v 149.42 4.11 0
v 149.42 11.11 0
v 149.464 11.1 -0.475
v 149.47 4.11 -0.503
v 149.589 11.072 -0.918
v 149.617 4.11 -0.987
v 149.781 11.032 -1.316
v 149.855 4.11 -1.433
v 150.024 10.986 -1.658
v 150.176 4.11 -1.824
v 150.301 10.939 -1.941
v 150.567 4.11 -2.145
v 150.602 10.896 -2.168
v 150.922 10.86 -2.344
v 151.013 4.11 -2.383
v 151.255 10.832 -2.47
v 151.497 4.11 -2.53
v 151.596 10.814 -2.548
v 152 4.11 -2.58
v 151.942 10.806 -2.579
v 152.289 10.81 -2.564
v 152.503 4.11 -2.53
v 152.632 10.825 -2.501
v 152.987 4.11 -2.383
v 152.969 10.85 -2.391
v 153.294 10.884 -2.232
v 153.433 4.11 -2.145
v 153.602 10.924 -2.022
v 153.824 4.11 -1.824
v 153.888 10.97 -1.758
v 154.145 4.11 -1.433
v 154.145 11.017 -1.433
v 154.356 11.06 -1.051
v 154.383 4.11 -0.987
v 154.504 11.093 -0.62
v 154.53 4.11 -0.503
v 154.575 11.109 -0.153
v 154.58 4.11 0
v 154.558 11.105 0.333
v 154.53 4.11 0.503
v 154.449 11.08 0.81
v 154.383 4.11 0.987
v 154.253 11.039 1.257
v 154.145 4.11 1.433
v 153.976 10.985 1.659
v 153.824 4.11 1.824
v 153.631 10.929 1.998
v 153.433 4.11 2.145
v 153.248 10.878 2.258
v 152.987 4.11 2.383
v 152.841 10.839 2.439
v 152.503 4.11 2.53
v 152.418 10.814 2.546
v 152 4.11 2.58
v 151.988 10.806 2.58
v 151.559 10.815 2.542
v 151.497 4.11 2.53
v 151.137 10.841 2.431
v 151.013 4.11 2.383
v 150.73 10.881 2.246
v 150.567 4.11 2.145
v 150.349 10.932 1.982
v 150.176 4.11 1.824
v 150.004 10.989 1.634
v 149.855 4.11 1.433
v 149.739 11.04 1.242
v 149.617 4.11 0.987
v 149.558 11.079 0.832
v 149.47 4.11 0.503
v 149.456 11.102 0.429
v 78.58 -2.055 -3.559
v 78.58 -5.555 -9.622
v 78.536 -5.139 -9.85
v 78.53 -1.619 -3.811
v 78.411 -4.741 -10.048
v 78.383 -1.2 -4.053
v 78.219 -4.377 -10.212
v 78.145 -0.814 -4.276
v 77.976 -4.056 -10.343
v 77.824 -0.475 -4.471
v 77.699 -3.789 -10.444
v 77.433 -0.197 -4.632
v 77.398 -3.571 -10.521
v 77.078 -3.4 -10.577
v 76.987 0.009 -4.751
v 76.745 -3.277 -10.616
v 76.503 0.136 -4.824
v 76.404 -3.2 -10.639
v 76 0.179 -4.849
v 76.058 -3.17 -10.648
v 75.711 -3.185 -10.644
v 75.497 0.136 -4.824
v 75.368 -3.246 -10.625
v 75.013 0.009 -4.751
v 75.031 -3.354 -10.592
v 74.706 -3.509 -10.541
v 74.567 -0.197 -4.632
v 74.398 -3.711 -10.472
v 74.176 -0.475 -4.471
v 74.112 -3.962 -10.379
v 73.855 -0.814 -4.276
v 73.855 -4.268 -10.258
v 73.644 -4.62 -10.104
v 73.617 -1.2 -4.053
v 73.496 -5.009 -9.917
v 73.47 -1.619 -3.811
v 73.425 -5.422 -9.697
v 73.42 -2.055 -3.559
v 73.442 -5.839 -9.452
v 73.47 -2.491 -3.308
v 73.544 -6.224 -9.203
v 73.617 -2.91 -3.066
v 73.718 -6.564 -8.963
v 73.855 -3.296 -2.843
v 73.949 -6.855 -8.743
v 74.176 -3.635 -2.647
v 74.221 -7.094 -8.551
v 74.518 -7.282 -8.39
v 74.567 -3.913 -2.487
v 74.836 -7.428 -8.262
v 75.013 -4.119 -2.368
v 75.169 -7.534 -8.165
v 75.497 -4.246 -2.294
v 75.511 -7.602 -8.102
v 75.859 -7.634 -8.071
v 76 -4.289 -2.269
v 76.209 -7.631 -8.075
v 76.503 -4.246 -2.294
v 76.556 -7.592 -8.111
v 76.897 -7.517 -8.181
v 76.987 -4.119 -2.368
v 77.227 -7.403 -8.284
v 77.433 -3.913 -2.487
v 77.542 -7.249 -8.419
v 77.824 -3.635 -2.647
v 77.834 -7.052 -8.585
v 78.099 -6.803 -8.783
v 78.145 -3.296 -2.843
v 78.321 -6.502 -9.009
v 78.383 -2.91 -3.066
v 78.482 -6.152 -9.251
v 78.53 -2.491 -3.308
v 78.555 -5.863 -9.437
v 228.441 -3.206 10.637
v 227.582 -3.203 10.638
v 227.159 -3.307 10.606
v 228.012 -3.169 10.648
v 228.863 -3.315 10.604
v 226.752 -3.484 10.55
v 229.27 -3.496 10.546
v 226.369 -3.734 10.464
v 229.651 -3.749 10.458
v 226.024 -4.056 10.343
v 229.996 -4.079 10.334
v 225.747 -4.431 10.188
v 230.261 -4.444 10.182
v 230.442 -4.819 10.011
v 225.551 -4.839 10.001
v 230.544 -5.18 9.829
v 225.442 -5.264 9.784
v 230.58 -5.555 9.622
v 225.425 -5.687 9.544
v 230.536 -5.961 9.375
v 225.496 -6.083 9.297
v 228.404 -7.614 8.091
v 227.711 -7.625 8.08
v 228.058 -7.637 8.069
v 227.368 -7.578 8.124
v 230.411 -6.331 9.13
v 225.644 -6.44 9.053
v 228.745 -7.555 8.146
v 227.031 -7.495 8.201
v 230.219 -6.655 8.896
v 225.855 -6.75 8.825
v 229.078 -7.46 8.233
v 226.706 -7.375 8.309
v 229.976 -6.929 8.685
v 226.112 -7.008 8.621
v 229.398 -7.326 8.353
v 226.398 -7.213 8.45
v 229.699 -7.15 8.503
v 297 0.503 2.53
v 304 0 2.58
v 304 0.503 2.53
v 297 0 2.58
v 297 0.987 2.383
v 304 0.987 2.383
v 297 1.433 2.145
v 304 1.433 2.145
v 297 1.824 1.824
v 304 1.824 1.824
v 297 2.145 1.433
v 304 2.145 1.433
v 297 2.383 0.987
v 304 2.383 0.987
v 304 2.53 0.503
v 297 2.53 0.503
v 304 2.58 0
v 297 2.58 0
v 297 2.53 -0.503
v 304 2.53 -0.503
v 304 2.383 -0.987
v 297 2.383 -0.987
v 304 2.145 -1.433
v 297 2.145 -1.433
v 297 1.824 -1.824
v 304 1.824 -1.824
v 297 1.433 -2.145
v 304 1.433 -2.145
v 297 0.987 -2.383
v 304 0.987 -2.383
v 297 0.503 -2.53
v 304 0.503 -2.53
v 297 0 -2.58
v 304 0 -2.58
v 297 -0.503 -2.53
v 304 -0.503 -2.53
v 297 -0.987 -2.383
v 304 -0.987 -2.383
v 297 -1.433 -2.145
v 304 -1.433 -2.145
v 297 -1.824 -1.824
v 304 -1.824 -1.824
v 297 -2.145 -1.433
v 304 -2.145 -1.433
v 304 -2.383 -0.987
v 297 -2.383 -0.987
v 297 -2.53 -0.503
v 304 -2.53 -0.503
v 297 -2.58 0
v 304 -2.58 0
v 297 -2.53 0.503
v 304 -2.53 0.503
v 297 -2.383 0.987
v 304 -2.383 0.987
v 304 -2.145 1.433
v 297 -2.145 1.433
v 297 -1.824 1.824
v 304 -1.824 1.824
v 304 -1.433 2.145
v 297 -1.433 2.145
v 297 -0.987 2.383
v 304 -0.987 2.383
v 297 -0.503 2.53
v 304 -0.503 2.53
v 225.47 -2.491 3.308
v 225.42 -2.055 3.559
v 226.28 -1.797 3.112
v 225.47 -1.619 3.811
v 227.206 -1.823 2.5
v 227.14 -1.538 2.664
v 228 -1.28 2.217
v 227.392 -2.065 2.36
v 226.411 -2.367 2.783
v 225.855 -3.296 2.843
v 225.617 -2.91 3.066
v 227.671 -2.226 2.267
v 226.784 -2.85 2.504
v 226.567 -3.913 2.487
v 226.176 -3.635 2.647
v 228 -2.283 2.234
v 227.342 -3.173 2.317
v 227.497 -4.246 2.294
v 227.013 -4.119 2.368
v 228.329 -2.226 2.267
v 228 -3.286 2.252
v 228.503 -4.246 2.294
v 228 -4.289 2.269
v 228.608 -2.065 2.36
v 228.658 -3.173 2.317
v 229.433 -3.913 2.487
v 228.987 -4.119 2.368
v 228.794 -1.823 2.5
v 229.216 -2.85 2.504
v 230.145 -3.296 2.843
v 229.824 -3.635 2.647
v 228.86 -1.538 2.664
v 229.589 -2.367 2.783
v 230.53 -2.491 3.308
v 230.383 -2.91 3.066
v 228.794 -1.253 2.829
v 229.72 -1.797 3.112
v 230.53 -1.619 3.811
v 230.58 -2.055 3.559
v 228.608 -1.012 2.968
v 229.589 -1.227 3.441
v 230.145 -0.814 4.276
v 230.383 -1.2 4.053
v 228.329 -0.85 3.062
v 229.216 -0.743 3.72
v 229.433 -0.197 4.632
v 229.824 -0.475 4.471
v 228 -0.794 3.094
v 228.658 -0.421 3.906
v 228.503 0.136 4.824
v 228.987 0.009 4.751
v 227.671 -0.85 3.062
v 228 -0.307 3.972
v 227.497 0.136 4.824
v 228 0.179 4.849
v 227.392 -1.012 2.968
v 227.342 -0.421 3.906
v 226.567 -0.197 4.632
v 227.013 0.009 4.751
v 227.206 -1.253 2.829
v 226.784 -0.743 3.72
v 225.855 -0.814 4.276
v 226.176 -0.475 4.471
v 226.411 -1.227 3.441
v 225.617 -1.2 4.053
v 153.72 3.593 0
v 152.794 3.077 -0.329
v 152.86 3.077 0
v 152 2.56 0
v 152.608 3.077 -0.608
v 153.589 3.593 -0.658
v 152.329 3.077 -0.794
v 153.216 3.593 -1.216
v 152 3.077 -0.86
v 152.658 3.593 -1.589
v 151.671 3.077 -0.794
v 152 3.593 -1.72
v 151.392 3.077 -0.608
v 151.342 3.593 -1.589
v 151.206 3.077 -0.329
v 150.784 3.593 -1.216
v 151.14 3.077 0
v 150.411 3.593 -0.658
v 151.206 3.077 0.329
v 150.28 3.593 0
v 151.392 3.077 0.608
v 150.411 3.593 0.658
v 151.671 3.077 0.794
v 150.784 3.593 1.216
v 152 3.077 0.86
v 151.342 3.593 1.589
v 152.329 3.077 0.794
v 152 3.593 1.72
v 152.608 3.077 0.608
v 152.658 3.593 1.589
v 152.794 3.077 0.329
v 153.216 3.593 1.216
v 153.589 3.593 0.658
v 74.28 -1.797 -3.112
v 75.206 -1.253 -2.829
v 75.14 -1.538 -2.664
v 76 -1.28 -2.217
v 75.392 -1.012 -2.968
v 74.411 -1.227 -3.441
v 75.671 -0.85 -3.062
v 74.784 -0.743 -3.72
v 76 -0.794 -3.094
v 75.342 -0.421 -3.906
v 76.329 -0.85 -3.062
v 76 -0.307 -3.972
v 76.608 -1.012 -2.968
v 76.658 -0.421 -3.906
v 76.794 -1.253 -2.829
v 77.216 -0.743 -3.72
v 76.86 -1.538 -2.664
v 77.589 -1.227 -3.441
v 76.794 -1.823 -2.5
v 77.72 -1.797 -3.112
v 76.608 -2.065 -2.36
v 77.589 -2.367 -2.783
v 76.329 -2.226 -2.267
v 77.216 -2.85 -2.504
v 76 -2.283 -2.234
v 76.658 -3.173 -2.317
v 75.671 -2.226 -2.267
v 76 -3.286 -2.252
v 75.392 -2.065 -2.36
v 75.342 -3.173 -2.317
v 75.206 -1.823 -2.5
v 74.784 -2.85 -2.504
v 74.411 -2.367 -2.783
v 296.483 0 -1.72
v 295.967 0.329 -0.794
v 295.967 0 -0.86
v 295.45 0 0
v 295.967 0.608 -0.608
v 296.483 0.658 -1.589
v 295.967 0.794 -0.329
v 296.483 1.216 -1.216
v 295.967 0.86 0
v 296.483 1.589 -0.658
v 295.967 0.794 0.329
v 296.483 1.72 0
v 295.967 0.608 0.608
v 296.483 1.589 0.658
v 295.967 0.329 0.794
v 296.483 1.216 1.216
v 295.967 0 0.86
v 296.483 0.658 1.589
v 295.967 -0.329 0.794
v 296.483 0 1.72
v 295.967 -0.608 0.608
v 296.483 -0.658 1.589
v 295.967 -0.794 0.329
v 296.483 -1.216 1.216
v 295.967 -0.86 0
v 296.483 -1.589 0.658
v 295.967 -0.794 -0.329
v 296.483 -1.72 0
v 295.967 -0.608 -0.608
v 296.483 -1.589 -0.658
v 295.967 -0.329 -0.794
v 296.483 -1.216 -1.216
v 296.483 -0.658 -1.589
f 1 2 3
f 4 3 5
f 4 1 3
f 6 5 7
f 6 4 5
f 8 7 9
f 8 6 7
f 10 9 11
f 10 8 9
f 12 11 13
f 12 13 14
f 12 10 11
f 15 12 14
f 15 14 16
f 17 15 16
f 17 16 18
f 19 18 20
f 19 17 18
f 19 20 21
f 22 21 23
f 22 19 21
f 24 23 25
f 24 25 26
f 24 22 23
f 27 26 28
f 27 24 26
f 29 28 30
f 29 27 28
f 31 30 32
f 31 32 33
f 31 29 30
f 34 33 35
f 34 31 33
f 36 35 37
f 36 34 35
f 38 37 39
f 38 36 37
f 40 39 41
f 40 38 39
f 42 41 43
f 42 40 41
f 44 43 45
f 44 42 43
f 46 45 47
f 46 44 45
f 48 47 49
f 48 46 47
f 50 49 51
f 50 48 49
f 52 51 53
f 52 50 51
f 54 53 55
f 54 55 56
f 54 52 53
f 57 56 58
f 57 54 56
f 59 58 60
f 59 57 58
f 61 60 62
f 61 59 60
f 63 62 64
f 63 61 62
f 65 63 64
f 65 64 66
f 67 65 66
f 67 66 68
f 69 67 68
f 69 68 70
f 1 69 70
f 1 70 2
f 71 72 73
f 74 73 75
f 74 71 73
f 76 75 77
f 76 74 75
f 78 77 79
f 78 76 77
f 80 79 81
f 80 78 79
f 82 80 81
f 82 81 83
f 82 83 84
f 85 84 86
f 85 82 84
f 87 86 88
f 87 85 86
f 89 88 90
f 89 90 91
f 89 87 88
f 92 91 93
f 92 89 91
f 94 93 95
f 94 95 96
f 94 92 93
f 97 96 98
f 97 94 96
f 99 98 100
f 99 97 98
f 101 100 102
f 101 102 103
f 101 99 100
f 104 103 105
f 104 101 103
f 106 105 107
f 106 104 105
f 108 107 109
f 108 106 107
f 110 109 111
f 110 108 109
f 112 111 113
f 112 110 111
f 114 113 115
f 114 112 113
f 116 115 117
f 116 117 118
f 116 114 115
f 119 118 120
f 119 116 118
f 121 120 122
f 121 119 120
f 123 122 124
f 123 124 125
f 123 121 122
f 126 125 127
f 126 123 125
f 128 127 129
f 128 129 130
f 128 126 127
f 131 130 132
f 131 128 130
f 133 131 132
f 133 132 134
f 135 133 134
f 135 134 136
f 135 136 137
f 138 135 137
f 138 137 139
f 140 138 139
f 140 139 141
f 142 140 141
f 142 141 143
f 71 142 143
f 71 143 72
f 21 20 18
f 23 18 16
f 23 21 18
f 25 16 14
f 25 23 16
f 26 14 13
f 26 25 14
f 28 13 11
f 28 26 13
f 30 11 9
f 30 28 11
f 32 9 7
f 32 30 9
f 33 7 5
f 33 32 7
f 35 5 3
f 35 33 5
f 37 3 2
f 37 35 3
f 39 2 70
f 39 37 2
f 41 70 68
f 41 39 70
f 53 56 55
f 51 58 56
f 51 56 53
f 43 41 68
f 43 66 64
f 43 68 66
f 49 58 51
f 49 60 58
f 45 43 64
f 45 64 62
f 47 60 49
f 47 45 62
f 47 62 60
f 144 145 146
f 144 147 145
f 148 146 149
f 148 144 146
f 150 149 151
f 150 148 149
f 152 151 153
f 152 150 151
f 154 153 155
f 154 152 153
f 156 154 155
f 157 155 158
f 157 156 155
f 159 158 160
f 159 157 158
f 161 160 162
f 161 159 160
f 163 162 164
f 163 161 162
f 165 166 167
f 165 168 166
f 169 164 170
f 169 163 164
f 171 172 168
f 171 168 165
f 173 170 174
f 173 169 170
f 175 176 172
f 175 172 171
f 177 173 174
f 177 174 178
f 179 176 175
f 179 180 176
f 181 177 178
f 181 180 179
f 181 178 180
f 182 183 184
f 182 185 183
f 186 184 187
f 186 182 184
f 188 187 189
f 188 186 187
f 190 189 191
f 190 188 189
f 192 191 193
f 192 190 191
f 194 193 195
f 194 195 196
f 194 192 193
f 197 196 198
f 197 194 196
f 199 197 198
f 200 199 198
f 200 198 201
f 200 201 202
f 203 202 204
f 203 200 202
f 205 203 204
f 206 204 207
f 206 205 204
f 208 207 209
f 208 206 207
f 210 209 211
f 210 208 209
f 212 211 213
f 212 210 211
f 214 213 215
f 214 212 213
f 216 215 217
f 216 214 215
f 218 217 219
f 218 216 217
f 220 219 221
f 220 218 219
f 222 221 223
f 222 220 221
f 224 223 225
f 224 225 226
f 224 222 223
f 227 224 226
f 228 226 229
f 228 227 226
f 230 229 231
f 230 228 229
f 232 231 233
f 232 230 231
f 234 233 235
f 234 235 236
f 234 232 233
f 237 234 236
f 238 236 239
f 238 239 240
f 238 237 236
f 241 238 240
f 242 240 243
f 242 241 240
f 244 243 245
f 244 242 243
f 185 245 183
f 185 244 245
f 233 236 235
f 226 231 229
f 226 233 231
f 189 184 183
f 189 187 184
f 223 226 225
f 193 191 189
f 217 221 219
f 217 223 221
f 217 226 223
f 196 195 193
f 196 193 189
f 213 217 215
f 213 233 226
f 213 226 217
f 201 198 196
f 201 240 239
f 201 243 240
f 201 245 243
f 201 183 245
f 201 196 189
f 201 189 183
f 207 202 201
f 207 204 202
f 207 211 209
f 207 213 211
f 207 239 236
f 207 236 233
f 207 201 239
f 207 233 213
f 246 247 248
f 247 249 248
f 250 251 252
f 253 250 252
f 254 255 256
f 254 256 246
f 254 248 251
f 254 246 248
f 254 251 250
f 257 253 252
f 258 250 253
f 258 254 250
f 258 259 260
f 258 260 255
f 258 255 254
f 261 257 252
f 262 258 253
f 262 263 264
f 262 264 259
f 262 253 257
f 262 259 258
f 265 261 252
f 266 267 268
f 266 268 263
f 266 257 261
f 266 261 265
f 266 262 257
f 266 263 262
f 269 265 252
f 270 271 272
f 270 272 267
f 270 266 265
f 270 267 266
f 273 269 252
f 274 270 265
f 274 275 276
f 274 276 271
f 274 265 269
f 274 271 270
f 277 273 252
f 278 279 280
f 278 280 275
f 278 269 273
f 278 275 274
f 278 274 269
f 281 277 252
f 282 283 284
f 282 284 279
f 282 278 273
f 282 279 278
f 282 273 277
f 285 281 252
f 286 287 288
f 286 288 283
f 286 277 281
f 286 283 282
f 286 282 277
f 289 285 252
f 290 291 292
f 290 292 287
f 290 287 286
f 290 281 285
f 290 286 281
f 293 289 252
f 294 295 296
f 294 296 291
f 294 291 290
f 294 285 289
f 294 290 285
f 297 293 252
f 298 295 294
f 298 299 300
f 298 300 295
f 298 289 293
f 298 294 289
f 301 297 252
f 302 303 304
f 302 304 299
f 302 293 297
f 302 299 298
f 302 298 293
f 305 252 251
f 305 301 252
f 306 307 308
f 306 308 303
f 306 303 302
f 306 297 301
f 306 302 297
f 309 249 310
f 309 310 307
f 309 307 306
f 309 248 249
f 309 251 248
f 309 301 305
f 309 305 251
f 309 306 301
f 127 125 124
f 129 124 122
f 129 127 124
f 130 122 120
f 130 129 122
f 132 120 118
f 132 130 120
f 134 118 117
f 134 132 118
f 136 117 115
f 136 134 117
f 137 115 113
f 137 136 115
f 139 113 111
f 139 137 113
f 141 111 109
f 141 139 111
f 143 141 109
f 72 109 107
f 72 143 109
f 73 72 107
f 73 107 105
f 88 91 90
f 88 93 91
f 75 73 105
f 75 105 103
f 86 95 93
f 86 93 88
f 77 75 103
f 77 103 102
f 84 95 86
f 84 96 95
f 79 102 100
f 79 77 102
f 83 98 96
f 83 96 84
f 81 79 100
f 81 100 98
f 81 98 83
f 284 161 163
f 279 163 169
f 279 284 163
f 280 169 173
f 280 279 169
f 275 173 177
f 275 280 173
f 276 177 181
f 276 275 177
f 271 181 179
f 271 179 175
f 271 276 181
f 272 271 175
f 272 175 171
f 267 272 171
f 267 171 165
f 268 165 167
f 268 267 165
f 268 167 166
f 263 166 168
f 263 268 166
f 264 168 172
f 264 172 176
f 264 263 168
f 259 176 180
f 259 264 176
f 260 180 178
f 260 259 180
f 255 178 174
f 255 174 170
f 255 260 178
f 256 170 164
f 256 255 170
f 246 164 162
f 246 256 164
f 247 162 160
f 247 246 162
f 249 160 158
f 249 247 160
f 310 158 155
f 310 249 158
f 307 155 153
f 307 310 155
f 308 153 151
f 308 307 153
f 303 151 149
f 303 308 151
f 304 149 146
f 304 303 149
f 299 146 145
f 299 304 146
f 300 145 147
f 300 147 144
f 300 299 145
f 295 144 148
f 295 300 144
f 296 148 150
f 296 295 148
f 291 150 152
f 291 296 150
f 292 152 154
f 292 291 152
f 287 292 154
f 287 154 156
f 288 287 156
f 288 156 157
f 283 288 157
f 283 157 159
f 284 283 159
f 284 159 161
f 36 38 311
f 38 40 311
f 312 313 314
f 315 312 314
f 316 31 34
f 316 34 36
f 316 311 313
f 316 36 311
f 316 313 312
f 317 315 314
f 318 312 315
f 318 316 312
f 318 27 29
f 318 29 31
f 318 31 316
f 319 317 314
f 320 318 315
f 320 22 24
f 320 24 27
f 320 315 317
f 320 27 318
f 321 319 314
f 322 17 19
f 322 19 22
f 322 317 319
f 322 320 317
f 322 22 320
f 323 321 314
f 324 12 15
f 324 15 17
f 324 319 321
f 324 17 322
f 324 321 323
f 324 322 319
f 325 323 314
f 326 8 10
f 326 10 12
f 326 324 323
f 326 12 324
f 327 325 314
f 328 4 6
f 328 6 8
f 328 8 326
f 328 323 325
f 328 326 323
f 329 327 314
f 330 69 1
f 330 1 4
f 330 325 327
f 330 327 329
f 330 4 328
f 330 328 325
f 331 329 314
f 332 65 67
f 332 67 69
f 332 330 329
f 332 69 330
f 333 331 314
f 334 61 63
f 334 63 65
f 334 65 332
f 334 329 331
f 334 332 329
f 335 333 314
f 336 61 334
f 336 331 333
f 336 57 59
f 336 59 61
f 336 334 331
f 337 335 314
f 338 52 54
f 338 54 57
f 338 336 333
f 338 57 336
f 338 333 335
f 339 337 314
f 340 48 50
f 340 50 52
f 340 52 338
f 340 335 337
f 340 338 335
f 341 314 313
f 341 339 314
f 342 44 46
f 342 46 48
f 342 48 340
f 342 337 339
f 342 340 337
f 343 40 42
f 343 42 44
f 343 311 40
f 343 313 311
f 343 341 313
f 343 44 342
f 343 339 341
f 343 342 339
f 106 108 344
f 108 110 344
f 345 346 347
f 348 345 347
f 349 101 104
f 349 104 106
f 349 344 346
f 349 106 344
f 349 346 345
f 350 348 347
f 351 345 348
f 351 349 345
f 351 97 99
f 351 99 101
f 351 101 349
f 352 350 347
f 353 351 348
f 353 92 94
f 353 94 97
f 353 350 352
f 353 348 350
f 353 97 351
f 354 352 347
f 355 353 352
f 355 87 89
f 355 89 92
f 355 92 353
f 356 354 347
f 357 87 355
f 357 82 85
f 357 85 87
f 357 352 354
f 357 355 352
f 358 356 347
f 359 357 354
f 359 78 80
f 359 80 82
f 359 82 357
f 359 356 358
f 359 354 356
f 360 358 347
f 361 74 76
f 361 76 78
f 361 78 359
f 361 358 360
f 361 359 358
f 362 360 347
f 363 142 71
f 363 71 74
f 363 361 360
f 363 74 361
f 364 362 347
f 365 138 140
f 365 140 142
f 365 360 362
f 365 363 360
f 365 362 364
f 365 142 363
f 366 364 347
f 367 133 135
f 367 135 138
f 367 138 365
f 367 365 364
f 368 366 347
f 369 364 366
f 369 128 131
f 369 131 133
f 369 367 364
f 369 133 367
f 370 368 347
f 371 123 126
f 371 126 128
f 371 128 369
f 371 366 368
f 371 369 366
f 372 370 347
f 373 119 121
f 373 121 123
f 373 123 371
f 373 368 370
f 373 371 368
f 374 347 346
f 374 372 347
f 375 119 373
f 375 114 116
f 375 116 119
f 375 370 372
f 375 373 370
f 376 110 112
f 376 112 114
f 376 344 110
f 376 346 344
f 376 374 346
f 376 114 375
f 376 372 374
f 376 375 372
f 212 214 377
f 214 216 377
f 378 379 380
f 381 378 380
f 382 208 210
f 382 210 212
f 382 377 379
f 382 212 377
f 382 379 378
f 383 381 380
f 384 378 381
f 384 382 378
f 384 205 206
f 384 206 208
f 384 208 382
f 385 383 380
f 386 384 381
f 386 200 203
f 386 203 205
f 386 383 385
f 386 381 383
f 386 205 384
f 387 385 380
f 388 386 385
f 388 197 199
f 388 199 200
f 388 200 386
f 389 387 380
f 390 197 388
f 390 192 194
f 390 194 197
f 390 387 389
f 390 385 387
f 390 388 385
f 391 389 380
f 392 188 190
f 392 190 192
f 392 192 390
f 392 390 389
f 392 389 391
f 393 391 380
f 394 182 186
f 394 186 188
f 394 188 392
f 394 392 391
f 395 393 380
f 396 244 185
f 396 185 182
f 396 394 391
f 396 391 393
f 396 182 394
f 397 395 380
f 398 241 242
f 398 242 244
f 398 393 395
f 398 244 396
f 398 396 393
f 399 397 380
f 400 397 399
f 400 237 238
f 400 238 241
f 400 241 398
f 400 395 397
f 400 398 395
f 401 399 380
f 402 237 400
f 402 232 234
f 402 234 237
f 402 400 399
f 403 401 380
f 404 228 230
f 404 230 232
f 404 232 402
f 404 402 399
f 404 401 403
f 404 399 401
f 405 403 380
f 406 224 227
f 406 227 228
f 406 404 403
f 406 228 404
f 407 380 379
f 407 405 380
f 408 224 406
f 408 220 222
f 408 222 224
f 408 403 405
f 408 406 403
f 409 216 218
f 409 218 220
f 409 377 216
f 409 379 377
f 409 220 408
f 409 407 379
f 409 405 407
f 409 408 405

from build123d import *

# Parameters (mm, degrees)
SKETCH1_R                            = 11.11
BOSS_EXTRUDE1_DEPTH                  = 304
F_3_0_3_DIAMETER_HOLE2_D             = 3
F_3_0_3_DIAMETER_HOLE2_DEPTH         = 11
F_3_0_3_DIAMETER_HOLE2_TIP           = 0.901290929
F_13_64_0_20313_DIAMETER_HOLE2_D     = 5.159502
F_13_64_0_20313_DIAMETER_HOLE2_DEPTH = 7
F_13_64_0_20313_DIAMETER_HOLE2_TIP   = 1.550070783
F_13_64_0_20313_DIAMETER_HOLE4_D     = 5.159502
F_13_64_0_20313_DIAMETER_HOLE4_DEPTH = 7
F_13_64_0_20313_DIAMETER_HOLE4_TIP   = 1.550070783
F_13_64_0_20313_DIAMETER_HOLE5_D     = 5.159502
F_13_64_0_20313_DIAMETER_HOLE5_DEPTH = 7
F_13_64_0_20313_DIAMETER_HOLE5_TIP   = 1.550070783
F_13_64_0_20313_DIAMETER_HOLE6_D     = 5.159502
F_13_64_0_20313_DIAMETER_HOLE6_DEPTH = 7
F_13_64_0_20313_DIAMETER_HOLE6_TIP   = 1.550070783
SKETCH22_R                           = 11.11
BOSS_EXTRUDE5_DEPTH                  = 304
SKETCH23_R                           = 11.11
BOSS_EXTRUDE6_DEPTH                  = 264


with BuildPart() as part:
    # Sketch1 → Boss-Extrude1 (new body)
    with BuildSketch(Plane(origin=(0, 0, 0), x_dir=(0, 0, -1), z_dir=(1, 0, 0))):
        Circle(SKETCH1_R)
    extrude(amount=BOSS_EXTRUDE1_DEPTH)

    # Ø3.0 (3) Diameter Hole2
    with Locations(Plane.ZY):
        with Locations((0, 5.3)):
            Hole(F_3_0_3_DIAMETER_HOLE2_D / 2, depth=F_3_0_3_DIAMETER_HOLE2_DEPTH)
            with Locations((0, 0, -(F_3_0_3_DIAMETER_HOLE2_DEPTH + F_3_0_3_DIAMETER_HOLE2_TIP / 2))):  # 118° drill point
                Cone(0, F_3_0_3_DIAMETER_HOLE2_D / 2, F_3_0_3_DIAMETER_HOLE2_TIP, mode=Mode.SUBTRACT)

    # 13/64 (0.20313) Diameter Hole2
    with Locations(Plane(origin=(0, 11.11, 0), x_dir=(1, 0, 0), z_dir=(0, 1, 0))):
        with Locations((152, 0)):
            Hole(F_13_64_0_20313_DIAMETER_HOLE2_D / 2, depth=F_13_64_0_20313_DIAMETER_HOLE2_DEPTH)
            with Locations((0, 0, -(F_13_64_0_20313_DIAMETER_HOLE2_DEPTH + F_13_64_0_20313_DIAMETER_HOLE2_TIP / 2))):  # 118° drill point
                Cone(0, F_13_64_0_20313_DIAMETER_HOLE2_D / 2, F_13_64_0_20313_DIAMETER_HOLE2_TIP, mode=Mode.SUBTRACT)

    # 13/64 (0.20313) Diameter Hole4
    with Locations(Plane(origin=(0, -5.555, -9.621542236), x_dir=(-1, 0, 0), z_dir=(0, -0.50000000000001, -0.8660254037844328))):
        with Locations((-76, 0)):
            Hole(F_13_64_0_20313_DIAMETER_HOLE4_D / 2, depth=F_13_64_0_20313_DIAMETER_HOLE4_DEPTH)
            with Locations((0, 0, -(F_13_64_0_20313_DIAMETER_HOLE4_DEPTH + F_13_64_0_20313_DIAMETER_HOLE4_TIP / 2))):  # 118° drill point
                Cone(0, F_13_64_0_20313_DIAMETER_HOLE4_D / 2, F_13_64_0_20313_DIAMETER_HOLE4_TIP, mode=Mode.SUBTRACT)

    # 13/64 (0.20313) Diameter Hole5
    with Locations(Plane(origin=(0, -5.555, 9.621542236), x_dir=(-1, 0, 0), z_dir=(0, -0.499999999999998, 0.8660254037844398))):
        with Locations((-228, 0)):
            Hole(F_13_64_0_20313_DIAMETER_HOLE5_D / 2, depth=F_13_64_0_20313_DIAMETER_HOLE5_DEPTH)
            with Locations((0, 0, -(F_13_64_0_20313_DIAMETER_HOLE5_DEPTH + F_13_64_0_20313_DIAMETER_HOLE5_TIP / 2))):  # 118° drill point
                Cone(0, F_13_64_0_20313_DIAMETER_HOLE5_D / 2, F_13_64_0_20313_DIAMETER_HOLE5_TIP, mode=Mode.SUBTRACT)

    # 13/64 (0.20313) Diameter Hole6
    with Locations(Plane(origin=(304, 0, 0), x_dir=(0, 0, -1), z_dir=(1, 0, 0))):
        with Locations((0, 0)):
            Hole(F_13_64_0_20313_DIAMETER_HOLE6_D / 2, depth=F_13_64_0_20313_DIAMETER_HOLE6_DEPTH)
            with Locations((0, 0, -(F_13_64_0_20313_DIAMETER_HOLE6_DEPTH + F_13_64_0_20313_DIAMETER_HOLE6_TIP / 2))):  # 118° drill point
                Cone(0, F_13_64_0_20313_DIAMETER_HOLE6_D / 2, F_13_64_0_20313_DIAMETER_HOLE6_TIP, mode=Mode.SUBTRACT)


with BuildPart() as body_2:
    # Sketch22 → Boss-Extrude5 (new body)
    with BuildSketch(Plane(origin=(0, 0, 0), x_dir=(0, 0, -1), z_dir=(1, 0, 0))):
        Circle(SKETCH22_R)
    extrude(amount=BOSS_EXTRUDE5_DEPTH)


with BuildPart() as body_2_2:
    # Sketch23 → Boss-Extrude6 (new body)
    with BuildSketch(Plane(origin=(304, 0, 0), x_dir=(0, 0, -1), z_dir=(1, 0, 0))):
        Circle(SKETCH23_R)
    extrude(amount=-BOSS_EXTRUDE6_DEPTH)

    # Combine3: cut part
    add(part.part, mode=Mode.SUBTRACT)


solid = body_2_2.part
